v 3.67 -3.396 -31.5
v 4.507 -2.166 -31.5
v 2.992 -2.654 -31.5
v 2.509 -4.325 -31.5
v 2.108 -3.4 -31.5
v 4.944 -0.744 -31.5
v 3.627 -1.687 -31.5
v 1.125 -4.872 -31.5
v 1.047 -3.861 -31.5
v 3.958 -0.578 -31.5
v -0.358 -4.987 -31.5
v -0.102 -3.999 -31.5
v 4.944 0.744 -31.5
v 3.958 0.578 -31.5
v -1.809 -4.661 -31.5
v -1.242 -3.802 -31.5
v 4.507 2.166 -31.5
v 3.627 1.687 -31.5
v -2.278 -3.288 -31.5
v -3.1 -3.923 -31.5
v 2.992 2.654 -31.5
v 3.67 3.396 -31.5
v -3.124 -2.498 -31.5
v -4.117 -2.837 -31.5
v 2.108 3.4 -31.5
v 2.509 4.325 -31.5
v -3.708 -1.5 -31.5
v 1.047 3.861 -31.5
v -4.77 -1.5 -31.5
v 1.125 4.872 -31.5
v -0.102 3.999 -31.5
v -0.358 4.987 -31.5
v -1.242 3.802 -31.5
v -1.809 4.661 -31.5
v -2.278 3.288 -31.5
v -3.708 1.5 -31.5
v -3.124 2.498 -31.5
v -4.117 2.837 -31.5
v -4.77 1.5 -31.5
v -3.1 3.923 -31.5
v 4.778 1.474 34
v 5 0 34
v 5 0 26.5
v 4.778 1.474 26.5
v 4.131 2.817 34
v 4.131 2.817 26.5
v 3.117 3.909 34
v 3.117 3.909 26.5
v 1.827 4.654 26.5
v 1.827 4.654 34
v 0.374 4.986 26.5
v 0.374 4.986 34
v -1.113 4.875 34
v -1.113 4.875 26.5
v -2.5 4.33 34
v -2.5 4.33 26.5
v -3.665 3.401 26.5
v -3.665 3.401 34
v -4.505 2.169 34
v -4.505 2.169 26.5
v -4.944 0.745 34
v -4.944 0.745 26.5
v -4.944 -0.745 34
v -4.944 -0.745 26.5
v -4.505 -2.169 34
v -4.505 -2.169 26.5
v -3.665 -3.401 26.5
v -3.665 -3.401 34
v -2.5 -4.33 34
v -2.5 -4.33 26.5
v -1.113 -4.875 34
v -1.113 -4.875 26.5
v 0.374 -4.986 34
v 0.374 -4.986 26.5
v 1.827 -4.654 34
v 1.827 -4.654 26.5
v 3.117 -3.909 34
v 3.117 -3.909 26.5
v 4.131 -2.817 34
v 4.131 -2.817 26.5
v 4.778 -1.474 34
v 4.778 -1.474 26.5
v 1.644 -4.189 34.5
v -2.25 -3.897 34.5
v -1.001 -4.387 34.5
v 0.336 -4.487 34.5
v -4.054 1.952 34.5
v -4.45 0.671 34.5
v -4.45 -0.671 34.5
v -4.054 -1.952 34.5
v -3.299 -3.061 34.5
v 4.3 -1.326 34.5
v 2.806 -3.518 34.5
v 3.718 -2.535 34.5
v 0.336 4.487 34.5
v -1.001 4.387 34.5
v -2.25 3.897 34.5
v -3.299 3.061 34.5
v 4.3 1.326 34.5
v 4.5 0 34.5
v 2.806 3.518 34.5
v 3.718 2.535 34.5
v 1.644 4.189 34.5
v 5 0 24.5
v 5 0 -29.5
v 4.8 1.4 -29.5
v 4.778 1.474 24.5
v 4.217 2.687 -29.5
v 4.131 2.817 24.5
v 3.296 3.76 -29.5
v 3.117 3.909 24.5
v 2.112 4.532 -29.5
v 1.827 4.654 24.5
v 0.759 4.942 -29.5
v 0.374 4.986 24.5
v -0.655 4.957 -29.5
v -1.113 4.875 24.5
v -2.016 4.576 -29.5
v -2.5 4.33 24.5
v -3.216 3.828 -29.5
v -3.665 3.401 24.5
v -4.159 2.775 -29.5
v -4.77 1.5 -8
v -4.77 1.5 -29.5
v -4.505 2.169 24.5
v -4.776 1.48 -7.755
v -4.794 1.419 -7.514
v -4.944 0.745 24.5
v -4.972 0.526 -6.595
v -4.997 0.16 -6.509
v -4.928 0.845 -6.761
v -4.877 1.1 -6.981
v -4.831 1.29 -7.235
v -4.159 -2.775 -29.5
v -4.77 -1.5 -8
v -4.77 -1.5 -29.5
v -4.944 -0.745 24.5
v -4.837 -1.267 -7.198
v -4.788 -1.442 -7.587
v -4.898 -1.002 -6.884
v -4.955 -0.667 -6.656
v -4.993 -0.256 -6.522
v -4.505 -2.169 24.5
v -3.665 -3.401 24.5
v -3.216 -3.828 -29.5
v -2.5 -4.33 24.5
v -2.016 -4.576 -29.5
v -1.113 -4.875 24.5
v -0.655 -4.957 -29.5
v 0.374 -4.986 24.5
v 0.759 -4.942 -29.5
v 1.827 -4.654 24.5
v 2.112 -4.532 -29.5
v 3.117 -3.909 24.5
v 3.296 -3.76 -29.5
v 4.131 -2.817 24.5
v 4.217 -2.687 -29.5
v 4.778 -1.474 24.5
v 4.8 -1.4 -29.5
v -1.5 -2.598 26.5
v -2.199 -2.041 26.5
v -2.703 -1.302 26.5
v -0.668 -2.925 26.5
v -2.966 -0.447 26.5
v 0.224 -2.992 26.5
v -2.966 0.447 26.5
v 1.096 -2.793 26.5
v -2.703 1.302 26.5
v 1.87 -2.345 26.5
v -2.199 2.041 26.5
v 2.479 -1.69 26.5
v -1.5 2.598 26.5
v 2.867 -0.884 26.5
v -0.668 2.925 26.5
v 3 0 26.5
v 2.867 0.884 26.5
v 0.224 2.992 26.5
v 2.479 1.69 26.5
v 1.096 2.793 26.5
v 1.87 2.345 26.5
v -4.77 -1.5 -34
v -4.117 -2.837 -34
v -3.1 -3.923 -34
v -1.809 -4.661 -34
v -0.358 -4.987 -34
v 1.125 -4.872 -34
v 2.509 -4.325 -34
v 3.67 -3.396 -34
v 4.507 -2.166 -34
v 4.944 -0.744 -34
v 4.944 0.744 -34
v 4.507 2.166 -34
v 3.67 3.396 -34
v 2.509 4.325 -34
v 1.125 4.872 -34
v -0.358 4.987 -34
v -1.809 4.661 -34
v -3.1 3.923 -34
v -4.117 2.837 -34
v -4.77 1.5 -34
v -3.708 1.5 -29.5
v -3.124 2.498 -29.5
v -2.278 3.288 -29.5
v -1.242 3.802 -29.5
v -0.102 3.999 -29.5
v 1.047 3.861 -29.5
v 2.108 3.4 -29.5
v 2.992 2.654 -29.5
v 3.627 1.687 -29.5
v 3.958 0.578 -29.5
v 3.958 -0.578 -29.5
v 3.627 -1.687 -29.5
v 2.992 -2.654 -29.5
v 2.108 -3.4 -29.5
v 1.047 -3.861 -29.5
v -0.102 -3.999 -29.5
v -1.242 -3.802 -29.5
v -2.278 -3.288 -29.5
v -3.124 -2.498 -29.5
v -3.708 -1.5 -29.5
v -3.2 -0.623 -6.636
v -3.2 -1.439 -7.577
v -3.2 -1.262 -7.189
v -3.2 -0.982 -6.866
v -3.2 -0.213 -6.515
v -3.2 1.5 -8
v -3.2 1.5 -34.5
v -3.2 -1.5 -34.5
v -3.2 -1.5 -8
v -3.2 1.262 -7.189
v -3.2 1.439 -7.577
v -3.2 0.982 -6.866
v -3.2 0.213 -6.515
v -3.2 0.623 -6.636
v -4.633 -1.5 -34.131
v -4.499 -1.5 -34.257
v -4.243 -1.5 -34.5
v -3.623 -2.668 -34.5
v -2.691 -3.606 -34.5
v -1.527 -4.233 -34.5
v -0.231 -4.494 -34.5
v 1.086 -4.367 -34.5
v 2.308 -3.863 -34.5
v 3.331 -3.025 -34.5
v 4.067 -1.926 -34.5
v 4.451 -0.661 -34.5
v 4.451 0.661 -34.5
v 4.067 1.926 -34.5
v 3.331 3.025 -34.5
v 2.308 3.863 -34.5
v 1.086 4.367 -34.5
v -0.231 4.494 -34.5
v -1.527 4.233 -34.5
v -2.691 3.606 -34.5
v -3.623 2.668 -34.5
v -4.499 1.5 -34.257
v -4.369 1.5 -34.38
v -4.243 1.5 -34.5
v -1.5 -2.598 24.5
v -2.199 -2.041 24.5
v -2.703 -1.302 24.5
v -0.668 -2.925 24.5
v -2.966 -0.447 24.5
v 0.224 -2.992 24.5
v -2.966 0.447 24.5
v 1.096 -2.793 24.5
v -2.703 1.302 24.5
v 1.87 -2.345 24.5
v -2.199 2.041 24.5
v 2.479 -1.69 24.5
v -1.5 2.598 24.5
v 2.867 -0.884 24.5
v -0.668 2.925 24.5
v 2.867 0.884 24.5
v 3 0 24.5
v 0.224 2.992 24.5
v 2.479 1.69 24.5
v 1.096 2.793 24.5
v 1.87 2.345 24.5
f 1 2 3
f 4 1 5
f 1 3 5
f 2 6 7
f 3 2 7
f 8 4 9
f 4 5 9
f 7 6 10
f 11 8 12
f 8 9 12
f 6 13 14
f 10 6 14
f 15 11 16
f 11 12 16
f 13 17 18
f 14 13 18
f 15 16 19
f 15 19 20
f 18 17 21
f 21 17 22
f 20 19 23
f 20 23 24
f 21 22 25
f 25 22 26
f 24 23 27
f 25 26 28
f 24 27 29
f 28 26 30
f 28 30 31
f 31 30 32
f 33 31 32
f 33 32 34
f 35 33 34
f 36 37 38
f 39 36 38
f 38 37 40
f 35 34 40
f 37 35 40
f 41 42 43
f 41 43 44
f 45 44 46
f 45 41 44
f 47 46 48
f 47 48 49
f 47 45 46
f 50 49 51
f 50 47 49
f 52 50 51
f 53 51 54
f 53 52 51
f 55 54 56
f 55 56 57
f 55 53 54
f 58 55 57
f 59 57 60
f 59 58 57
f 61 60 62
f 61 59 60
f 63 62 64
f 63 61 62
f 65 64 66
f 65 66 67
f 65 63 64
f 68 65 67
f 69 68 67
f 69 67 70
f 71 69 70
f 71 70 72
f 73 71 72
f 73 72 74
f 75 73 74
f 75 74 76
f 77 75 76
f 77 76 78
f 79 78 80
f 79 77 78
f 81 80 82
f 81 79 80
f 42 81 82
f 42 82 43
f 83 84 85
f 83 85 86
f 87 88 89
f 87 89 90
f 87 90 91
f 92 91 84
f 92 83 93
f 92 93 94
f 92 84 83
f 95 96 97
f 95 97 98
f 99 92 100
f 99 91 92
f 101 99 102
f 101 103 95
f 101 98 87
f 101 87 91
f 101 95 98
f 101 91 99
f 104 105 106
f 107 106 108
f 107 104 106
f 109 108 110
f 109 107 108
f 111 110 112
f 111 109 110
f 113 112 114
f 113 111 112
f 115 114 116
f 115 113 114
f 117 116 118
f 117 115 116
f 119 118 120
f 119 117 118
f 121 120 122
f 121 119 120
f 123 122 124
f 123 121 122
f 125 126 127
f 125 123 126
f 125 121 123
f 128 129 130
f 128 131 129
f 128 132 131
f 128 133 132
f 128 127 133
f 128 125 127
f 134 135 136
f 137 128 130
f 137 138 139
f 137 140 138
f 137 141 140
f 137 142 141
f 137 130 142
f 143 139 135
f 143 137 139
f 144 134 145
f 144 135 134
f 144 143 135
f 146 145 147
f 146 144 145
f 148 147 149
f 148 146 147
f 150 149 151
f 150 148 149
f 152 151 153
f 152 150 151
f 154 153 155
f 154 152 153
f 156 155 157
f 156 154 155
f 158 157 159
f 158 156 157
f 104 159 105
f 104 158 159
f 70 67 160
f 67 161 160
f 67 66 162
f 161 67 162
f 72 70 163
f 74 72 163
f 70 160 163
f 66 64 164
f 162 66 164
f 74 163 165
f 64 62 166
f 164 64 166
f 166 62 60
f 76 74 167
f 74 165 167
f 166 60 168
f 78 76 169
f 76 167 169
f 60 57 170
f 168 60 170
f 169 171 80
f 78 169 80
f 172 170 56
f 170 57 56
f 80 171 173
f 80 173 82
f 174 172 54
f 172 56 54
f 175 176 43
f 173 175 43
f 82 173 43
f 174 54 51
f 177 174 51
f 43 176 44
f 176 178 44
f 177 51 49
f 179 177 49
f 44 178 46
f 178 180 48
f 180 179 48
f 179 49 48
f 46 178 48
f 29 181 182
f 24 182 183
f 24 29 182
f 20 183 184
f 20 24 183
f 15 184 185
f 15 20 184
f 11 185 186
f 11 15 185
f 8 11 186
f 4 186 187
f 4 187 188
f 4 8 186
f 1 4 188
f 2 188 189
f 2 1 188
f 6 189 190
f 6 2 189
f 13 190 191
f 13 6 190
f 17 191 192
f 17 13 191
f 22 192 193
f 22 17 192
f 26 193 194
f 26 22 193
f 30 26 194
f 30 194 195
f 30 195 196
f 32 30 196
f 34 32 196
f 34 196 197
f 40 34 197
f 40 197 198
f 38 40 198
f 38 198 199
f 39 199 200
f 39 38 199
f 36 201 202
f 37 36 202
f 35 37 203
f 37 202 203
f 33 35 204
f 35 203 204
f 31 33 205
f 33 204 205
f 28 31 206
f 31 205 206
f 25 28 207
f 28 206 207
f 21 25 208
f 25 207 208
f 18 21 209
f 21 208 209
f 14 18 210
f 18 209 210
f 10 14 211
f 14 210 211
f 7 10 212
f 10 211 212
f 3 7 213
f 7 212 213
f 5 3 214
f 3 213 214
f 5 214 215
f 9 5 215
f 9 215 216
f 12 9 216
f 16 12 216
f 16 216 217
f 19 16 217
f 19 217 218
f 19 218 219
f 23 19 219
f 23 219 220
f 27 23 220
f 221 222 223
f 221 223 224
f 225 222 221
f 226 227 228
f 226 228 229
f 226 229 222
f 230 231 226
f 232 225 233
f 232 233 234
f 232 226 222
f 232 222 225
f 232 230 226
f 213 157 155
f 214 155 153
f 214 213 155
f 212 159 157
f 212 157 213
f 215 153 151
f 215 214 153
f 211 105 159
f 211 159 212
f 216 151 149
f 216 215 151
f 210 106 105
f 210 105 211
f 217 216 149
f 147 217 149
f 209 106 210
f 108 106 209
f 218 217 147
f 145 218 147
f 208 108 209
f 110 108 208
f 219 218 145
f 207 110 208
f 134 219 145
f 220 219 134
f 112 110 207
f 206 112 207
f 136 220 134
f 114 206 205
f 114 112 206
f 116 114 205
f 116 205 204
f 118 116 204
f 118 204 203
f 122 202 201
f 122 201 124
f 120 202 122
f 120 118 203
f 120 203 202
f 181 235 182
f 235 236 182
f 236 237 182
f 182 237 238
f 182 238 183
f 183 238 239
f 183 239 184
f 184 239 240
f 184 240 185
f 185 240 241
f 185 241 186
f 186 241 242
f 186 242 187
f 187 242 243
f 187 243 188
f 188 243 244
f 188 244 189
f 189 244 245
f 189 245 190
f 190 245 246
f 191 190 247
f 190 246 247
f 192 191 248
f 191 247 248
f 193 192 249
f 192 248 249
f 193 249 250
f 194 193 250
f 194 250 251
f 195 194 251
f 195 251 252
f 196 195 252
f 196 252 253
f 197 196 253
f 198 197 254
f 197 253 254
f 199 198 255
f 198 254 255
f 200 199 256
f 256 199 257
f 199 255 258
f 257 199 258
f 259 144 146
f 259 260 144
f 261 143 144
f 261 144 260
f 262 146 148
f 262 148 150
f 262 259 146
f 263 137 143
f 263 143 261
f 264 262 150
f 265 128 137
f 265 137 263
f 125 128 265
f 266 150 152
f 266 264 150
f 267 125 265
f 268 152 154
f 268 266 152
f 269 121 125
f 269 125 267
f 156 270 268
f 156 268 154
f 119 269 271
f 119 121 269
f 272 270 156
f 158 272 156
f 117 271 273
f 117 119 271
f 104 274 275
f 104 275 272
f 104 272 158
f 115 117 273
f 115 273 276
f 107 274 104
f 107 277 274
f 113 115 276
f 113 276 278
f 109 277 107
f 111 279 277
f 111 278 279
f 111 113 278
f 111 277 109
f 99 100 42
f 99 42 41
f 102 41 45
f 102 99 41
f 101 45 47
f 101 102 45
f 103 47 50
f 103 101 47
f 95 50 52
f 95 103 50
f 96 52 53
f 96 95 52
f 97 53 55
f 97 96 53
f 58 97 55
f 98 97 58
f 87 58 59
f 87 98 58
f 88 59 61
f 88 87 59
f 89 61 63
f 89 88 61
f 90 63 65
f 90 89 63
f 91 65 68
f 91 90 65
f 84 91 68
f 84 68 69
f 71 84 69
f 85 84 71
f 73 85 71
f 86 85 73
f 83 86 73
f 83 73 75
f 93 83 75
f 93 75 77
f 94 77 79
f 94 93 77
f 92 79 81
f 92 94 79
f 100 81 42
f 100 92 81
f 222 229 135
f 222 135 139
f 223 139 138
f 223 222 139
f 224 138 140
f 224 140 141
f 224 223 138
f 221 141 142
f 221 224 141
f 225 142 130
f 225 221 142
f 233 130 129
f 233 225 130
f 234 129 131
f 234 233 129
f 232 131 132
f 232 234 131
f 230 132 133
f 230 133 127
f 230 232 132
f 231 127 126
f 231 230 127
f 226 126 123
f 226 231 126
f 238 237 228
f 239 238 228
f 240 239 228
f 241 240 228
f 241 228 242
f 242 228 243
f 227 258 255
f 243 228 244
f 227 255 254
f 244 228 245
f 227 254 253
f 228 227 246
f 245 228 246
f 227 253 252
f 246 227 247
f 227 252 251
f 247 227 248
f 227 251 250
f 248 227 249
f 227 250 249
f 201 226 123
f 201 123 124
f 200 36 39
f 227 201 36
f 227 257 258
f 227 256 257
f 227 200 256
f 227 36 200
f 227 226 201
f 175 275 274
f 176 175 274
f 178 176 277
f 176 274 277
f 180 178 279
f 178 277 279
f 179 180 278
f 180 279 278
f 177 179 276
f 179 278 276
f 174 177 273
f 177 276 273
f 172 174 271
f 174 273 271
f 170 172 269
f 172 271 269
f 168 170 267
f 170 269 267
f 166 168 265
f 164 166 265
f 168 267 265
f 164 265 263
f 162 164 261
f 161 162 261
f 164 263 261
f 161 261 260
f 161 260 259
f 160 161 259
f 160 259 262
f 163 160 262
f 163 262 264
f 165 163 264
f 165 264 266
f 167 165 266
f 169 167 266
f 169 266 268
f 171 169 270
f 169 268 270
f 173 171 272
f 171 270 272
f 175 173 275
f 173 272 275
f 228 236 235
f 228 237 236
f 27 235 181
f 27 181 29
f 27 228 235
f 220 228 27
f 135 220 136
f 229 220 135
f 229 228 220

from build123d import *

# Parameters (mm, degrees)
SKETCH1_R           = 5
BOSS_EXTRUDE1_DEPTH = 34.5
CUT_EXTRUDE1_START  = -10
SKETCH2_R           = 5
SKETCH2_R_2         = 3
CUT_EXTRUDE1_DEPTH  = 2
CUT_EXTRUDE2_START  = -5
SKETCH4_R           = 5
SKETCH4_R_2         = 4
CUT_EXTRUDE2_DEPTH  = 2
CHAMFER1_SIZE       = 0.5
CUT_EXTRUDE4_START  = -3.2
CUT_EXTRUDE4_DEPTH  = 2.8


with BuildPart() as part:
    # Sketch1 → Boss-Extrude1 (new body, symmetric)
    with BuildSketch(Plane.XY):
        Circle(SKETCH1_R)
    extrude(amount=BOSS_EXTRUDE1_DEPTH, both=True)

    # Sketch2 → Cut-Extrude1 (cut)
    with BuildSketch(Plane.XY.offset(34.5).offset(CUT_EXTRUDE1_START)):
        Circle(SKETCH2_R)
        Circle(SKETCH2_R_2, mode=Mode.SUBTRACT)
    extrude(amount=CUT_EXTRUDE1_DEPTH, mode=Mode.SUBTRACT)

    # Sketch4 → Cut-Extrude2 (cut)
    with BuildSketch(Plane(origin=(0, 0, -34.5), x_dir=(-1, 0, 0), z_dir=(0, 0, -1)).offset(CUT_EXTRUDE2_START)):
        Circle(SKETCH4_R)
        Circle(SKETCH4_R_2, mode=Mode.SUBTRACT)
    extrude(amount=CUT_EXTRUDE2_DEPTH, mode=Mode.SUBTRACT)

    # Chamfer1
    chamfer1_edges = [part.edges().sort_by_distance(p)[0] for p in [
        (-5, 0, -34.5),
        (-5, 0, 34.5),
    ]]
    chamfer(chamfer1_edges, length=CHAMFER1_SIZE)

    # Sketch7 → Cut-Extrude4 (cut, through all)
    with BuildSketch(Plane(origin=(0, 0, 0), x_dir=(0, 0, -1), z_dir=(1, 0, 0)).offset(CUT_EXTRUDE4_START)):
        with BuildLine():
            Line((8, 1.5), (34.5, 1.5))
            Line((34.5, 1.5), (34.5, -1.5))
            Line((34.5, -1.5), (8, -1.5))
            ThreePointArc((8, -1.5), (6.5, 0), (8, 1.5))
        make_face()
    extrude(amount=-CUT_EXTRUDE4_DEPTH, mode=Mode.SUBTRACT)


solid = part.part
